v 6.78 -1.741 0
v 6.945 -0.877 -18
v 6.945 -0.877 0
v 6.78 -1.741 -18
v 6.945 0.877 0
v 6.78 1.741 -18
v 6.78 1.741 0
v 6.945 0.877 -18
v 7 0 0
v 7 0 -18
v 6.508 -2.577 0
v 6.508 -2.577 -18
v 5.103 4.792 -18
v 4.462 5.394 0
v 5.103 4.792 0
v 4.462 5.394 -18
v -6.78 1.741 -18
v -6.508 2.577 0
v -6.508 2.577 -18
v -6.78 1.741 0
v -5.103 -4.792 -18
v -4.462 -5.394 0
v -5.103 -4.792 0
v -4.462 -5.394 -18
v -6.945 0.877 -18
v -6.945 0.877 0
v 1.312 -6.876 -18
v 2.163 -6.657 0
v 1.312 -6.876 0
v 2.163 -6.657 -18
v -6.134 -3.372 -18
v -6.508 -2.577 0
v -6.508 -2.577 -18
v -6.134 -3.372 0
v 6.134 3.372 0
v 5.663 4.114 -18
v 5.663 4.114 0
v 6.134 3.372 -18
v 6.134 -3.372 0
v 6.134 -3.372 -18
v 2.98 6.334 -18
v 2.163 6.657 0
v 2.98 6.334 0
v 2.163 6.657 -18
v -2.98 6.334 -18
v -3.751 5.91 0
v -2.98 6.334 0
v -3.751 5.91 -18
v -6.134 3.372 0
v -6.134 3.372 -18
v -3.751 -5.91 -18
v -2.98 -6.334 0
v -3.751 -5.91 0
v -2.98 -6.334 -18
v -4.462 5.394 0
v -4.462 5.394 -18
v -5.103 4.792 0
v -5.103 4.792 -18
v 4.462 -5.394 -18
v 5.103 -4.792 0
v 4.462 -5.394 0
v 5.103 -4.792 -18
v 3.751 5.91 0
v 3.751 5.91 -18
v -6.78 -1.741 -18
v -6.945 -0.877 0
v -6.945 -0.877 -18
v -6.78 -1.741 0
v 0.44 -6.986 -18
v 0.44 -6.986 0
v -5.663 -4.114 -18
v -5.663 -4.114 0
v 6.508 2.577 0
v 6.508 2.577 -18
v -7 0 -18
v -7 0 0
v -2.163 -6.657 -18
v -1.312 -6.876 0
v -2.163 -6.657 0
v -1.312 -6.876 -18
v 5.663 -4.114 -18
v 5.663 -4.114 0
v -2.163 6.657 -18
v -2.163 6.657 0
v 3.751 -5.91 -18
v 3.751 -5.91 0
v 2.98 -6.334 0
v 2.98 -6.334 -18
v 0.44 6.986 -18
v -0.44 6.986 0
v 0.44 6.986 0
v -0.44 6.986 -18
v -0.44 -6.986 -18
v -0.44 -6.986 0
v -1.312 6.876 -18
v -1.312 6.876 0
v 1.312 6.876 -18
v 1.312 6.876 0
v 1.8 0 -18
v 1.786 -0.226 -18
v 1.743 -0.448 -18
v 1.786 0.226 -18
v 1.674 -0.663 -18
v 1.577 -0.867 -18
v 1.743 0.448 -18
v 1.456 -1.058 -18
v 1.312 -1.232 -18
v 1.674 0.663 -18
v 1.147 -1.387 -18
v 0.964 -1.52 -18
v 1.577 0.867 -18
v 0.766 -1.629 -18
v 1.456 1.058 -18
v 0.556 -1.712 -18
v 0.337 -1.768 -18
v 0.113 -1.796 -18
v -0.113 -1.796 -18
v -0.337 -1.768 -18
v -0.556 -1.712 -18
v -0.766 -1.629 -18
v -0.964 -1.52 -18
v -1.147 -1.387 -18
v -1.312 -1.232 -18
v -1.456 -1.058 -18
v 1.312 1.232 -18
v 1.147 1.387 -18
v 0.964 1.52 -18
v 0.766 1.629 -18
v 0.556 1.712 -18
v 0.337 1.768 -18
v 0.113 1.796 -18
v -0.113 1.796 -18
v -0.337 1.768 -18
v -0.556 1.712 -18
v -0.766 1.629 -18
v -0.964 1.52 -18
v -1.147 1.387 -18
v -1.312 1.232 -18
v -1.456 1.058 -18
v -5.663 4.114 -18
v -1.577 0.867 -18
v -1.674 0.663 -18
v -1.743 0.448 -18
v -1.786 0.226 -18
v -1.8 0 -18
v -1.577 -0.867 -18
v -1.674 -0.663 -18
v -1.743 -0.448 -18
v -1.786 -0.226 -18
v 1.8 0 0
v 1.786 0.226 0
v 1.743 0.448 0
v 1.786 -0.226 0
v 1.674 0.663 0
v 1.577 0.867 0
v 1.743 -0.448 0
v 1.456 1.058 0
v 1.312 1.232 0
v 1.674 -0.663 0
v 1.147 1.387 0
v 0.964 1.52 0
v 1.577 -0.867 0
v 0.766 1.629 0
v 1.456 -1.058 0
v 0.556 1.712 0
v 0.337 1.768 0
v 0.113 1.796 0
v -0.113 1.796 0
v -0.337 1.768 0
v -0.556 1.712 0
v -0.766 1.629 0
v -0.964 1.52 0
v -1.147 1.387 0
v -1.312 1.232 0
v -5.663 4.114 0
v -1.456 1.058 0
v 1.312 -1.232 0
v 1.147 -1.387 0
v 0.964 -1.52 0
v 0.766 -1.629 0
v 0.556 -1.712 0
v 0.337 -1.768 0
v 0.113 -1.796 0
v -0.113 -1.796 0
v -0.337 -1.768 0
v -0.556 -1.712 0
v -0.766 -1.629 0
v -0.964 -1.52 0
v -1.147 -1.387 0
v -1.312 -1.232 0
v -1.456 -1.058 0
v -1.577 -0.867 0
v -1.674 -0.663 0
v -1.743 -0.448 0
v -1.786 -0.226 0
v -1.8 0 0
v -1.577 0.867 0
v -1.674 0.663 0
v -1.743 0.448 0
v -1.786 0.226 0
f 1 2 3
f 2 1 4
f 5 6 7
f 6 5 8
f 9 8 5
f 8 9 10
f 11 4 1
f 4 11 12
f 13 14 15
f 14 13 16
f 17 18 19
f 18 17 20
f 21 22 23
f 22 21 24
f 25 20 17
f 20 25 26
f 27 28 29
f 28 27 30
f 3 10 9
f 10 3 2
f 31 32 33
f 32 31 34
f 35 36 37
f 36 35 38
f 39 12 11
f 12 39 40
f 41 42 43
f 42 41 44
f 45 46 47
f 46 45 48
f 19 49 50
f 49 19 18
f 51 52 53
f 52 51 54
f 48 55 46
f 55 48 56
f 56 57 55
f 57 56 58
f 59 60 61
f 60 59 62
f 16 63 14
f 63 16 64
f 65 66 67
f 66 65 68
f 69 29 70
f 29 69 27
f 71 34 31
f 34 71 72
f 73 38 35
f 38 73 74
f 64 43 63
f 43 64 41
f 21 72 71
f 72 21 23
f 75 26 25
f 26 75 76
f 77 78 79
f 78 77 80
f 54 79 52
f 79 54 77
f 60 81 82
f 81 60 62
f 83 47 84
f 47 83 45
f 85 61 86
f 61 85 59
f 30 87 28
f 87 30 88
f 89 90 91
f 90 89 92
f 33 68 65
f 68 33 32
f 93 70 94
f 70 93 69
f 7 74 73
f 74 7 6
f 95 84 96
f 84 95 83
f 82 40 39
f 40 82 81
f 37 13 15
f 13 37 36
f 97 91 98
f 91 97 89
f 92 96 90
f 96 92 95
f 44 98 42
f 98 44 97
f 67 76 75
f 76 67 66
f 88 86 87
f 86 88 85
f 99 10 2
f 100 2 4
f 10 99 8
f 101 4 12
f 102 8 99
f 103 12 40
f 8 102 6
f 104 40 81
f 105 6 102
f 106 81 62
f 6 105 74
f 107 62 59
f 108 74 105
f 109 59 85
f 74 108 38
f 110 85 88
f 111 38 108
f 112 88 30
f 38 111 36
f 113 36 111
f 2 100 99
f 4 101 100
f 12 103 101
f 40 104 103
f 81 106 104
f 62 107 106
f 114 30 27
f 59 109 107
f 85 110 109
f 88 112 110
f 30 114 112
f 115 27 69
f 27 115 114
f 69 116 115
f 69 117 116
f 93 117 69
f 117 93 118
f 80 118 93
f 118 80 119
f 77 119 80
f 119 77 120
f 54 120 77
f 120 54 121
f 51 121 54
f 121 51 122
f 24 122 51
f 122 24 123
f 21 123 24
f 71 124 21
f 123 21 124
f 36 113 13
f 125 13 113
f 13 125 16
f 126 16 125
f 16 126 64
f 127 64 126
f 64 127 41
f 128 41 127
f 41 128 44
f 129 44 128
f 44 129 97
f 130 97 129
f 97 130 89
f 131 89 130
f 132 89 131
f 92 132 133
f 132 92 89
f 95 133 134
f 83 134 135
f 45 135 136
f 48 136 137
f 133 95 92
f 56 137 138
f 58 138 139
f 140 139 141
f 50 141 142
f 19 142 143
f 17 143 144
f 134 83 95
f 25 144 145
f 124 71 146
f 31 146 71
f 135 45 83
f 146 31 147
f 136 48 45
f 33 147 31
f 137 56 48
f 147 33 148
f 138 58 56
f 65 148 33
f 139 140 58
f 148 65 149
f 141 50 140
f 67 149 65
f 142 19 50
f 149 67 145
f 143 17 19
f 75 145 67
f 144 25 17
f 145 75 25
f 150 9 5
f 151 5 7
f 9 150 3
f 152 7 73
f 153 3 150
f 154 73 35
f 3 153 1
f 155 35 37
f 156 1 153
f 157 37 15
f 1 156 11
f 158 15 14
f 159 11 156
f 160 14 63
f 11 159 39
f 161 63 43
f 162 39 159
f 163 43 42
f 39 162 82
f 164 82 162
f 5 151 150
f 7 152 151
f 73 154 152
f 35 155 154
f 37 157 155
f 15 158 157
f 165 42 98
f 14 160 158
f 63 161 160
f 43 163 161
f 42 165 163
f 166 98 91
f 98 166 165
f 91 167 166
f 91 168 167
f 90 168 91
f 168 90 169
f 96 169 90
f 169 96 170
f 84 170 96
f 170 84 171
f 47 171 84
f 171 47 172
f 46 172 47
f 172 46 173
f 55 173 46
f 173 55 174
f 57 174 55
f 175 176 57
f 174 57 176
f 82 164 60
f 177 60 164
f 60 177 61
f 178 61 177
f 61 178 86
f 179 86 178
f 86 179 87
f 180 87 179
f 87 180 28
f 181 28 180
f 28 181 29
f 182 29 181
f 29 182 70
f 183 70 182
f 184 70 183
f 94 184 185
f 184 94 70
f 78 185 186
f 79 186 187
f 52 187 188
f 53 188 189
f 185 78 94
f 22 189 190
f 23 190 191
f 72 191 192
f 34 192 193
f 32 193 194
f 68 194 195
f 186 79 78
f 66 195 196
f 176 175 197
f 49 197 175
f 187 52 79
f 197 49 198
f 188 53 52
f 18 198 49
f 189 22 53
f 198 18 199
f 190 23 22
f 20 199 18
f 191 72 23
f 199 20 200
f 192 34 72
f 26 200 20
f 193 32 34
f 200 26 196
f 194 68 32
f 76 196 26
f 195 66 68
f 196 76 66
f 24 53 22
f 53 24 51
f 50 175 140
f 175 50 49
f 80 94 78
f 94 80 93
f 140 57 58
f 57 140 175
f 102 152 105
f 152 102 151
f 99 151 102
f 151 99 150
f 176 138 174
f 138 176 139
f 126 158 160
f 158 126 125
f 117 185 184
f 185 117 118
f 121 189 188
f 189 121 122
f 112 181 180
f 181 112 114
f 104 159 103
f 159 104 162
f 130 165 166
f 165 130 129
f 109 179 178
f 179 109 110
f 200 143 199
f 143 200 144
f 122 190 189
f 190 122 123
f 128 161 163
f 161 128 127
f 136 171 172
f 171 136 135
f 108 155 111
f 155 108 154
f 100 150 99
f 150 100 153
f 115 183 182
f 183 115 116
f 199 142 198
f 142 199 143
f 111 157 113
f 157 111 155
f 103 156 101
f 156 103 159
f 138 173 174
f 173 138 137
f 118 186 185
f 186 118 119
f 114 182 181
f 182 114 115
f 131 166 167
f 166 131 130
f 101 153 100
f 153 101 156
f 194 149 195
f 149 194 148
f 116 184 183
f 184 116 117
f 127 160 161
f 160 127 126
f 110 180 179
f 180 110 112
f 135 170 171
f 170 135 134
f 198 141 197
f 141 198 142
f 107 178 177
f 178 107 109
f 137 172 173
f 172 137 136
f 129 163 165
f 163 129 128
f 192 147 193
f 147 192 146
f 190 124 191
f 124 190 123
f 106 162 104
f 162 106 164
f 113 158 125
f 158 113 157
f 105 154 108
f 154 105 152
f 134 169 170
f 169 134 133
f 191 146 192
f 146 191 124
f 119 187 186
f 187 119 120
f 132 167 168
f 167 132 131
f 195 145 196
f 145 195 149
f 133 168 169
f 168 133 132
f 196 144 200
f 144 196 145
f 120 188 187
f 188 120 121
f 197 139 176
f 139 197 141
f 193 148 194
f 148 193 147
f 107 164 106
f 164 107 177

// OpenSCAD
$fn = 50;


difference() {
	union() {
		translate(v = [0, 0, -18.0000000000]) {
			cylinder(h = 18, r = 7.0000000000);
		}
		cylinder(h = 0, r = 16.0000000000);
	}
	union() {
		#translate(v = [0, 0, -18]) {
			cylinder(h = 18, r = 1.8000000000);
		}
	}
}
